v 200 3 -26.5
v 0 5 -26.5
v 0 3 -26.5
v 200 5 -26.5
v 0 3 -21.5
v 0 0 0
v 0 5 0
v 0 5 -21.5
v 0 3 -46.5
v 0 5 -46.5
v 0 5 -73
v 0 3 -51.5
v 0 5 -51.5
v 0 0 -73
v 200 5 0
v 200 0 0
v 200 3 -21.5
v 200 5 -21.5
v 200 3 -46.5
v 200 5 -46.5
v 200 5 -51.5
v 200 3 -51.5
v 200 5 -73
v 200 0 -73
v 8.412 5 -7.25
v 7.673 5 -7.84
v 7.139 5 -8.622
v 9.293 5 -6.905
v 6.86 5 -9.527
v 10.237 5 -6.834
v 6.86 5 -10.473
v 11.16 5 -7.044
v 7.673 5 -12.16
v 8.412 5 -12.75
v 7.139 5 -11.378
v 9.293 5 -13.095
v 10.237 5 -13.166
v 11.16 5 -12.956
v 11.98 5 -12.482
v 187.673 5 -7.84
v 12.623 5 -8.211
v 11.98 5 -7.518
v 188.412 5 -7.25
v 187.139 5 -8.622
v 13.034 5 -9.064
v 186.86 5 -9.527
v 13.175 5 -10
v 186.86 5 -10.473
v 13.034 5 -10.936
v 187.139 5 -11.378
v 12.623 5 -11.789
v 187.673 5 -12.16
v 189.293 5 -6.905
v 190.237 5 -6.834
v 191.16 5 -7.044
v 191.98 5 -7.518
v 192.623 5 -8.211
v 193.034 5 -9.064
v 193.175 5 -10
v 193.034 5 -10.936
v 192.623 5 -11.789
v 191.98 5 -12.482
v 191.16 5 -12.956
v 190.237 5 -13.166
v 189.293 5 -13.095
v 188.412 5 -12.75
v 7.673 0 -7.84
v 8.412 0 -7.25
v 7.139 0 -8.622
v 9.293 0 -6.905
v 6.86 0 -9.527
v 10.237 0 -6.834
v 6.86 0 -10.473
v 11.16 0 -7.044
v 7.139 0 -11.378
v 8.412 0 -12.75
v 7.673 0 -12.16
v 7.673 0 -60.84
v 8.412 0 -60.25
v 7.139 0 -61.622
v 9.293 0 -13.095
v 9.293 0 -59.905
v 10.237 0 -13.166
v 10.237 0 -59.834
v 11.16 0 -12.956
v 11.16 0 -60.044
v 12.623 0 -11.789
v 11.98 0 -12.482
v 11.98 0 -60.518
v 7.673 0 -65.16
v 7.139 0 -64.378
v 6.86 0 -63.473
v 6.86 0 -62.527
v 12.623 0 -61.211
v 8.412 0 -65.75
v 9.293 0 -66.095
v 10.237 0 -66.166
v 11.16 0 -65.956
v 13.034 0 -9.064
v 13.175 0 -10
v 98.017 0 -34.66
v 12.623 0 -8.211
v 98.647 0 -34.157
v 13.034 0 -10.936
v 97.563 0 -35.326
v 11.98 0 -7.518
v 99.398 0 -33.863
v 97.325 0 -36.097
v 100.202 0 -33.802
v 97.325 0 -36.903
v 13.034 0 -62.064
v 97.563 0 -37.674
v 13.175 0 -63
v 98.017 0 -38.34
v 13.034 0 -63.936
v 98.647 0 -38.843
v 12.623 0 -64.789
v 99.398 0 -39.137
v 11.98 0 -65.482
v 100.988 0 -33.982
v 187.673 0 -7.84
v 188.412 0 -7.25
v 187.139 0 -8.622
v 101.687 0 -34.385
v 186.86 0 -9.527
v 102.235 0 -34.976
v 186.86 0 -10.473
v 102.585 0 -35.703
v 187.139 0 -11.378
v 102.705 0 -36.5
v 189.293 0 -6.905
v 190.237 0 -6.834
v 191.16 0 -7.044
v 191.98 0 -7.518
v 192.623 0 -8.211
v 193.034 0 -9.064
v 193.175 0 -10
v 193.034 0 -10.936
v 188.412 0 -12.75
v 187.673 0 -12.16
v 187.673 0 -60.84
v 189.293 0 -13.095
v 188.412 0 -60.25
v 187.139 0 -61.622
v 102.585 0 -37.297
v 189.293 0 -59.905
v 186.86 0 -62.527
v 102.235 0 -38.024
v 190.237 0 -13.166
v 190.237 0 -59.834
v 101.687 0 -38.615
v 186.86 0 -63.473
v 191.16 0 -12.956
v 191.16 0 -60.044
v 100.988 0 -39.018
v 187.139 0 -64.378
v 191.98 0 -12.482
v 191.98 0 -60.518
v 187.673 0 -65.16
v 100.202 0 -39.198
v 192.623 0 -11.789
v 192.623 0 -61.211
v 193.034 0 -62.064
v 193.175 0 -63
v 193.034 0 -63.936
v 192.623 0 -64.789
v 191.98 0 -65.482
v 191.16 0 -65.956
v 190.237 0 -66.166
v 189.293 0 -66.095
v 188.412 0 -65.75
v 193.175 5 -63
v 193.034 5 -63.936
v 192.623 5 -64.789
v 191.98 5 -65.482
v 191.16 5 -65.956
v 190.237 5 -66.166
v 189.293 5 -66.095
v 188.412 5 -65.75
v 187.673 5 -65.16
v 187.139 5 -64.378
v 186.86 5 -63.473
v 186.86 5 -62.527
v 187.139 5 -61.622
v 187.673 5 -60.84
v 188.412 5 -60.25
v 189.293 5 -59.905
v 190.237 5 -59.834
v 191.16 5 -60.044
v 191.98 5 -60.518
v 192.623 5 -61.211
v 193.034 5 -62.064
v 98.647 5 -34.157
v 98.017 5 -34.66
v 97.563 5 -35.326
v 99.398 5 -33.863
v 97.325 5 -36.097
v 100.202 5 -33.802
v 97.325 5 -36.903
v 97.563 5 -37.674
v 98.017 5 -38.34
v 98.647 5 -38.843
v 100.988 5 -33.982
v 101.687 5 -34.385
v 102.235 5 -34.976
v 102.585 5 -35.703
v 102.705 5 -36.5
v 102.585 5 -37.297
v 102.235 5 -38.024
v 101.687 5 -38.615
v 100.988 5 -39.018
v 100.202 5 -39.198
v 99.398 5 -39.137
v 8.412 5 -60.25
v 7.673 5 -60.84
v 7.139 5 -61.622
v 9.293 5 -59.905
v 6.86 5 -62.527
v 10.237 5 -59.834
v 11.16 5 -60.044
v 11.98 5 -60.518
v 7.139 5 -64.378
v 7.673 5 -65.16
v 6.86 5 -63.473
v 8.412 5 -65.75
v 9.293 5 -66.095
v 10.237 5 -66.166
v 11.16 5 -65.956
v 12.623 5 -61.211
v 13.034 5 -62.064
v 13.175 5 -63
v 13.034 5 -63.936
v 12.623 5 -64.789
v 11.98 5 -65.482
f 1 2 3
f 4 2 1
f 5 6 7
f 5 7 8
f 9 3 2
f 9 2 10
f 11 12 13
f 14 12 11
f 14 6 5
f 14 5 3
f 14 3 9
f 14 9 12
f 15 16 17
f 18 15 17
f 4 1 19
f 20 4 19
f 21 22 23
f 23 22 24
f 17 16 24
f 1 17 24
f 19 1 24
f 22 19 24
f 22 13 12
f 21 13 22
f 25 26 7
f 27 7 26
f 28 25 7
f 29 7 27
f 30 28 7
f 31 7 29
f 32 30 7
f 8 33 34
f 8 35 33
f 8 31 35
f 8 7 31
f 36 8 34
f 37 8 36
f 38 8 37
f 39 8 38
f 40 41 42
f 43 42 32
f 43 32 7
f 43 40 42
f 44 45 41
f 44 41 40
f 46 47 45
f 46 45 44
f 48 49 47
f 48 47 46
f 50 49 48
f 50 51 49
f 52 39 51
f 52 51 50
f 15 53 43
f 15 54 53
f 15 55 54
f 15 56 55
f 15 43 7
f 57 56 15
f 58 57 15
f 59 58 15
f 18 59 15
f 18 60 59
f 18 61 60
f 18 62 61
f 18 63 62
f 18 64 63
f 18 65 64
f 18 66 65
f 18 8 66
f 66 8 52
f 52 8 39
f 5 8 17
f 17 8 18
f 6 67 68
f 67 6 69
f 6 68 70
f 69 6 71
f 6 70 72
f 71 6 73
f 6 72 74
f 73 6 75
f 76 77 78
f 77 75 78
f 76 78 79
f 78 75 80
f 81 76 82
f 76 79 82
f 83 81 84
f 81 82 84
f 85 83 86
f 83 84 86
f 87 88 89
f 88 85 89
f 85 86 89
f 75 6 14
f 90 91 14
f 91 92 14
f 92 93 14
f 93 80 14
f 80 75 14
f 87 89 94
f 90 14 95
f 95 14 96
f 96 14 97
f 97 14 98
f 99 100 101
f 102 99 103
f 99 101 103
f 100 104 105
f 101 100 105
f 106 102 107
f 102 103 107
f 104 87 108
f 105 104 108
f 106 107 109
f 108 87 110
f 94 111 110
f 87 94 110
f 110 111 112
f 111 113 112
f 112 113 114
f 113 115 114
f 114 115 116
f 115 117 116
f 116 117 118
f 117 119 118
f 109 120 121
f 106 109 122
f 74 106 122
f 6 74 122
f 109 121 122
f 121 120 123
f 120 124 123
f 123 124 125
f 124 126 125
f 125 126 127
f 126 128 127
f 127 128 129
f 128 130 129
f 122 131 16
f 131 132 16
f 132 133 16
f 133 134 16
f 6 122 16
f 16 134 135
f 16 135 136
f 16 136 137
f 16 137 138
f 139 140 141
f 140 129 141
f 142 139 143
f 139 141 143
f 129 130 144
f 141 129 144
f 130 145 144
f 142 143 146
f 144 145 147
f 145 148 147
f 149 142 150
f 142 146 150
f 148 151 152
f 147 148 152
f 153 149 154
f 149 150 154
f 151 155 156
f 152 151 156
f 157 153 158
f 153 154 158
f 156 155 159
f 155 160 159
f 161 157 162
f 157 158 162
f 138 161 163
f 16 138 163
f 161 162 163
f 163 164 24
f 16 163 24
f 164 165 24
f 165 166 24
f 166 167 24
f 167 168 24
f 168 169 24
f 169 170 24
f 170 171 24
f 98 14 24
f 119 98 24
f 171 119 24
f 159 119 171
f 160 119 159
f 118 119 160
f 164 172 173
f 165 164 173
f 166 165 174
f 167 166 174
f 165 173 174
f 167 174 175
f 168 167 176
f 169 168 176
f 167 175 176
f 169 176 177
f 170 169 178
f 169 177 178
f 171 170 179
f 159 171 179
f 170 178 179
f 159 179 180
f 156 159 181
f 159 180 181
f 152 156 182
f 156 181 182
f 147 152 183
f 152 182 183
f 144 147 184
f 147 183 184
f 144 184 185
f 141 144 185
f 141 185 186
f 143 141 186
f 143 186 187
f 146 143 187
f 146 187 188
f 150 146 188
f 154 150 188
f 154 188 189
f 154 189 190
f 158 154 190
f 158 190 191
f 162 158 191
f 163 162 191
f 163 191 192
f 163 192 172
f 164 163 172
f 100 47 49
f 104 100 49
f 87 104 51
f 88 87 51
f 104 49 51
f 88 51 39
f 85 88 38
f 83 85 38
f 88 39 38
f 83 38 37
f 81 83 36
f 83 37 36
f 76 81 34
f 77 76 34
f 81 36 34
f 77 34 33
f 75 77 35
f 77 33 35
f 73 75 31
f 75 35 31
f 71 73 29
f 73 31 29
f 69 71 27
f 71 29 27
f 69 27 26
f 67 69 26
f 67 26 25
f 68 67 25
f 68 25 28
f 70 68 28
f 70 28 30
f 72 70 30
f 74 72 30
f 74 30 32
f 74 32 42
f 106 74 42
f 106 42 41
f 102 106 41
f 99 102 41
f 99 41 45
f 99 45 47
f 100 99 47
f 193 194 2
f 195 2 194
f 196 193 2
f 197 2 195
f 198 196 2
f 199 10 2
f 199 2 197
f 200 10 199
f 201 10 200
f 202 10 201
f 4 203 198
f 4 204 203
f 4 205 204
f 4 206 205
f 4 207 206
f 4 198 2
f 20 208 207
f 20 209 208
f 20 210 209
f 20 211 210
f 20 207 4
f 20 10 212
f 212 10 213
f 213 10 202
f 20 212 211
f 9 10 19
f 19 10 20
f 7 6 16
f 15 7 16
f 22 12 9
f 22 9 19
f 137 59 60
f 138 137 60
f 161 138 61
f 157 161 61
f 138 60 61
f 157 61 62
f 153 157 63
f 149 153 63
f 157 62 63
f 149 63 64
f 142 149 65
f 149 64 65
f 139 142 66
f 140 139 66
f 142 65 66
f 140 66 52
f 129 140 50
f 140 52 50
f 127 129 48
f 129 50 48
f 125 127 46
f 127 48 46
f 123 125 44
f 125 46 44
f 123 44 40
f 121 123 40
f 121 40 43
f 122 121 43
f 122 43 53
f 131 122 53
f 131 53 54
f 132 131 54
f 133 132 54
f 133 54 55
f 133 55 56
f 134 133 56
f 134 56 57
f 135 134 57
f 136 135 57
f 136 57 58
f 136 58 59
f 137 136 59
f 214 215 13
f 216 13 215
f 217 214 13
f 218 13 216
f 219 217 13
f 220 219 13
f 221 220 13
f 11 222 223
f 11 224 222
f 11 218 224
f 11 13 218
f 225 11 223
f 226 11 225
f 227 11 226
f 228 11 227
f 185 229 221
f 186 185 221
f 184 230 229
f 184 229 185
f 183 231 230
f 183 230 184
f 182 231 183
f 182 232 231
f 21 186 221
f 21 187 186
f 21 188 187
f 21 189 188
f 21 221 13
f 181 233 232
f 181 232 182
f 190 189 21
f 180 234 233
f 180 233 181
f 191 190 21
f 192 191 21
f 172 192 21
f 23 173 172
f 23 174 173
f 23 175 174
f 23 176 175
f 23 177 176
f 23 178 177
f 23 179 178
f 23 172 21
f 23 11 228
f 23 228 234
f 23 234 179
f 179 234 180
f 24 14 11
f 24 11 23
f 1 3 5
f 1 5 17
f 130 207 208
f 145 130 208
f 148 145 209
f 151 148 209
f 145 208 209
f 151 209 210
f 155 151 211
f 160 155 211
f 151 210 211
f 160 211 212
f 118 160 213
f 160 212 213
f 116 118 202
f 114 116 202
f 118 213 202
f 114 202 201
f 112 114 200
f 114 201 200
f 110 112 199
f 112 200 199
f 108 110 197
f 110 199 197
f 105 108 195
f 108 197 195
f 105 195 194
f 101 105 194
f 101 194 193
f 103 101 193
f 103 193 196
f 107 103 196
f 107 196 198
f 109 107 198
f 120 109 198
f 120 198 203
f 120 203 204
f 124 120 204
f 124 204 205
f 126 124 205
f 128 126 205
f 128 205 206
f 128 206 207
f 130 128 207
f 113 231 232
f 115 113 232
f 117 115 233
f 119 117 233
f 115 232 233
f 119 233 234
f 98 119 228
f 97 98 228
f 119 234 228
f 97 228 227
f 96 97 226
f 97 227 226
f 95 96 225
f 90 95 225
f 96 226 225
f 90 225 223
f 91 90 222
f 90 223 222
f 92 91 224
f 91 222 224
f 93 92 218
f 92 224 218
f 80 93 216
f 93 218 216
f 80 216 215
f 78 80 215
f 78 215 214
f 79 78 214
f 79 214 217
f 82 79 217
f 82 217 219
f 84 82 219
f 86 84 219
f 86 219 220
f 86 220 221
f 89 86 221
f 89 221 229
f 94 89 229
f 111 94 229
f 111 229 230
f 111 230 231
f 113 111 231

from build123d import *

# Parameters (mm, degrees)
SKETCH1_W                   = 200
SKETCH1_H                   = 73
RIGHT_WALL_DEPTH            = 5
F_1_4_0_2500_DOWEL_HOLE1_D  = 6.35
TAP_DRILL_FOR_1_4_28_TAP2_D = 5.4102
SKETCH24_W                  = 200
SKETCH24_H                  = 5
CUT_EXTRUDE1_DEPTH          = 2


with BuildPart() as part:
    # Sketch1 → right wall (new body)
    with BuildSketch(Plane(origin=(0, 0, 0), x_dir=(1, 0, 0), z_dir=(0, 1, 0))):
        with Locations((100, 36.5)):
            Rectangle(SKETCH1_W, SKETCH1_H)
    extrude(amount=RIGHT_WALL_DEPTH)

    # 1/4 (0.2500) Dowel Hole1 (through all)
    with Locations(Plane(origin=(0, 0, 0), x_dir=(-1, 0, 0), z_dir=(0, -1, 0))):
        with Locations((-10, 10), (-10, 63), (-190, 63), (-190, 10)):
            Hole(F_1_4_0_2500_DOWEL_HOLE1_D / 2)

    # Tap Drill for 1/4-28 Tap2 (through all)
    with Locations(Plane(origin=(0, 0, 0), x_dir=(-1, 0, 0), z_dir=(0, -1, 0))):
        with Locations((-100, 36.5)):
            Hole(TAP_DRILL_FOR_1_4_28_TAP2_D / 2)

    # Sketch24 → Cut-Extrude1 (cut)
    with BuildSketch(Plane(origin=(0, 5, 0), x_dir=(1, 0, 0), z_dir=(0, 1, 0))):
        with Locations((100, 49)):
            Rectangle(SKETCH24_W, SKETCH24_H)
        with Locations((100, 24)):
            Rectangle(SKETCH24_W, SKETCH24_H)
    extrude(amount=-CUT_EXTRUDE1_DEPTH, mode=Mode.SUBTRACT)


solid = part.part
